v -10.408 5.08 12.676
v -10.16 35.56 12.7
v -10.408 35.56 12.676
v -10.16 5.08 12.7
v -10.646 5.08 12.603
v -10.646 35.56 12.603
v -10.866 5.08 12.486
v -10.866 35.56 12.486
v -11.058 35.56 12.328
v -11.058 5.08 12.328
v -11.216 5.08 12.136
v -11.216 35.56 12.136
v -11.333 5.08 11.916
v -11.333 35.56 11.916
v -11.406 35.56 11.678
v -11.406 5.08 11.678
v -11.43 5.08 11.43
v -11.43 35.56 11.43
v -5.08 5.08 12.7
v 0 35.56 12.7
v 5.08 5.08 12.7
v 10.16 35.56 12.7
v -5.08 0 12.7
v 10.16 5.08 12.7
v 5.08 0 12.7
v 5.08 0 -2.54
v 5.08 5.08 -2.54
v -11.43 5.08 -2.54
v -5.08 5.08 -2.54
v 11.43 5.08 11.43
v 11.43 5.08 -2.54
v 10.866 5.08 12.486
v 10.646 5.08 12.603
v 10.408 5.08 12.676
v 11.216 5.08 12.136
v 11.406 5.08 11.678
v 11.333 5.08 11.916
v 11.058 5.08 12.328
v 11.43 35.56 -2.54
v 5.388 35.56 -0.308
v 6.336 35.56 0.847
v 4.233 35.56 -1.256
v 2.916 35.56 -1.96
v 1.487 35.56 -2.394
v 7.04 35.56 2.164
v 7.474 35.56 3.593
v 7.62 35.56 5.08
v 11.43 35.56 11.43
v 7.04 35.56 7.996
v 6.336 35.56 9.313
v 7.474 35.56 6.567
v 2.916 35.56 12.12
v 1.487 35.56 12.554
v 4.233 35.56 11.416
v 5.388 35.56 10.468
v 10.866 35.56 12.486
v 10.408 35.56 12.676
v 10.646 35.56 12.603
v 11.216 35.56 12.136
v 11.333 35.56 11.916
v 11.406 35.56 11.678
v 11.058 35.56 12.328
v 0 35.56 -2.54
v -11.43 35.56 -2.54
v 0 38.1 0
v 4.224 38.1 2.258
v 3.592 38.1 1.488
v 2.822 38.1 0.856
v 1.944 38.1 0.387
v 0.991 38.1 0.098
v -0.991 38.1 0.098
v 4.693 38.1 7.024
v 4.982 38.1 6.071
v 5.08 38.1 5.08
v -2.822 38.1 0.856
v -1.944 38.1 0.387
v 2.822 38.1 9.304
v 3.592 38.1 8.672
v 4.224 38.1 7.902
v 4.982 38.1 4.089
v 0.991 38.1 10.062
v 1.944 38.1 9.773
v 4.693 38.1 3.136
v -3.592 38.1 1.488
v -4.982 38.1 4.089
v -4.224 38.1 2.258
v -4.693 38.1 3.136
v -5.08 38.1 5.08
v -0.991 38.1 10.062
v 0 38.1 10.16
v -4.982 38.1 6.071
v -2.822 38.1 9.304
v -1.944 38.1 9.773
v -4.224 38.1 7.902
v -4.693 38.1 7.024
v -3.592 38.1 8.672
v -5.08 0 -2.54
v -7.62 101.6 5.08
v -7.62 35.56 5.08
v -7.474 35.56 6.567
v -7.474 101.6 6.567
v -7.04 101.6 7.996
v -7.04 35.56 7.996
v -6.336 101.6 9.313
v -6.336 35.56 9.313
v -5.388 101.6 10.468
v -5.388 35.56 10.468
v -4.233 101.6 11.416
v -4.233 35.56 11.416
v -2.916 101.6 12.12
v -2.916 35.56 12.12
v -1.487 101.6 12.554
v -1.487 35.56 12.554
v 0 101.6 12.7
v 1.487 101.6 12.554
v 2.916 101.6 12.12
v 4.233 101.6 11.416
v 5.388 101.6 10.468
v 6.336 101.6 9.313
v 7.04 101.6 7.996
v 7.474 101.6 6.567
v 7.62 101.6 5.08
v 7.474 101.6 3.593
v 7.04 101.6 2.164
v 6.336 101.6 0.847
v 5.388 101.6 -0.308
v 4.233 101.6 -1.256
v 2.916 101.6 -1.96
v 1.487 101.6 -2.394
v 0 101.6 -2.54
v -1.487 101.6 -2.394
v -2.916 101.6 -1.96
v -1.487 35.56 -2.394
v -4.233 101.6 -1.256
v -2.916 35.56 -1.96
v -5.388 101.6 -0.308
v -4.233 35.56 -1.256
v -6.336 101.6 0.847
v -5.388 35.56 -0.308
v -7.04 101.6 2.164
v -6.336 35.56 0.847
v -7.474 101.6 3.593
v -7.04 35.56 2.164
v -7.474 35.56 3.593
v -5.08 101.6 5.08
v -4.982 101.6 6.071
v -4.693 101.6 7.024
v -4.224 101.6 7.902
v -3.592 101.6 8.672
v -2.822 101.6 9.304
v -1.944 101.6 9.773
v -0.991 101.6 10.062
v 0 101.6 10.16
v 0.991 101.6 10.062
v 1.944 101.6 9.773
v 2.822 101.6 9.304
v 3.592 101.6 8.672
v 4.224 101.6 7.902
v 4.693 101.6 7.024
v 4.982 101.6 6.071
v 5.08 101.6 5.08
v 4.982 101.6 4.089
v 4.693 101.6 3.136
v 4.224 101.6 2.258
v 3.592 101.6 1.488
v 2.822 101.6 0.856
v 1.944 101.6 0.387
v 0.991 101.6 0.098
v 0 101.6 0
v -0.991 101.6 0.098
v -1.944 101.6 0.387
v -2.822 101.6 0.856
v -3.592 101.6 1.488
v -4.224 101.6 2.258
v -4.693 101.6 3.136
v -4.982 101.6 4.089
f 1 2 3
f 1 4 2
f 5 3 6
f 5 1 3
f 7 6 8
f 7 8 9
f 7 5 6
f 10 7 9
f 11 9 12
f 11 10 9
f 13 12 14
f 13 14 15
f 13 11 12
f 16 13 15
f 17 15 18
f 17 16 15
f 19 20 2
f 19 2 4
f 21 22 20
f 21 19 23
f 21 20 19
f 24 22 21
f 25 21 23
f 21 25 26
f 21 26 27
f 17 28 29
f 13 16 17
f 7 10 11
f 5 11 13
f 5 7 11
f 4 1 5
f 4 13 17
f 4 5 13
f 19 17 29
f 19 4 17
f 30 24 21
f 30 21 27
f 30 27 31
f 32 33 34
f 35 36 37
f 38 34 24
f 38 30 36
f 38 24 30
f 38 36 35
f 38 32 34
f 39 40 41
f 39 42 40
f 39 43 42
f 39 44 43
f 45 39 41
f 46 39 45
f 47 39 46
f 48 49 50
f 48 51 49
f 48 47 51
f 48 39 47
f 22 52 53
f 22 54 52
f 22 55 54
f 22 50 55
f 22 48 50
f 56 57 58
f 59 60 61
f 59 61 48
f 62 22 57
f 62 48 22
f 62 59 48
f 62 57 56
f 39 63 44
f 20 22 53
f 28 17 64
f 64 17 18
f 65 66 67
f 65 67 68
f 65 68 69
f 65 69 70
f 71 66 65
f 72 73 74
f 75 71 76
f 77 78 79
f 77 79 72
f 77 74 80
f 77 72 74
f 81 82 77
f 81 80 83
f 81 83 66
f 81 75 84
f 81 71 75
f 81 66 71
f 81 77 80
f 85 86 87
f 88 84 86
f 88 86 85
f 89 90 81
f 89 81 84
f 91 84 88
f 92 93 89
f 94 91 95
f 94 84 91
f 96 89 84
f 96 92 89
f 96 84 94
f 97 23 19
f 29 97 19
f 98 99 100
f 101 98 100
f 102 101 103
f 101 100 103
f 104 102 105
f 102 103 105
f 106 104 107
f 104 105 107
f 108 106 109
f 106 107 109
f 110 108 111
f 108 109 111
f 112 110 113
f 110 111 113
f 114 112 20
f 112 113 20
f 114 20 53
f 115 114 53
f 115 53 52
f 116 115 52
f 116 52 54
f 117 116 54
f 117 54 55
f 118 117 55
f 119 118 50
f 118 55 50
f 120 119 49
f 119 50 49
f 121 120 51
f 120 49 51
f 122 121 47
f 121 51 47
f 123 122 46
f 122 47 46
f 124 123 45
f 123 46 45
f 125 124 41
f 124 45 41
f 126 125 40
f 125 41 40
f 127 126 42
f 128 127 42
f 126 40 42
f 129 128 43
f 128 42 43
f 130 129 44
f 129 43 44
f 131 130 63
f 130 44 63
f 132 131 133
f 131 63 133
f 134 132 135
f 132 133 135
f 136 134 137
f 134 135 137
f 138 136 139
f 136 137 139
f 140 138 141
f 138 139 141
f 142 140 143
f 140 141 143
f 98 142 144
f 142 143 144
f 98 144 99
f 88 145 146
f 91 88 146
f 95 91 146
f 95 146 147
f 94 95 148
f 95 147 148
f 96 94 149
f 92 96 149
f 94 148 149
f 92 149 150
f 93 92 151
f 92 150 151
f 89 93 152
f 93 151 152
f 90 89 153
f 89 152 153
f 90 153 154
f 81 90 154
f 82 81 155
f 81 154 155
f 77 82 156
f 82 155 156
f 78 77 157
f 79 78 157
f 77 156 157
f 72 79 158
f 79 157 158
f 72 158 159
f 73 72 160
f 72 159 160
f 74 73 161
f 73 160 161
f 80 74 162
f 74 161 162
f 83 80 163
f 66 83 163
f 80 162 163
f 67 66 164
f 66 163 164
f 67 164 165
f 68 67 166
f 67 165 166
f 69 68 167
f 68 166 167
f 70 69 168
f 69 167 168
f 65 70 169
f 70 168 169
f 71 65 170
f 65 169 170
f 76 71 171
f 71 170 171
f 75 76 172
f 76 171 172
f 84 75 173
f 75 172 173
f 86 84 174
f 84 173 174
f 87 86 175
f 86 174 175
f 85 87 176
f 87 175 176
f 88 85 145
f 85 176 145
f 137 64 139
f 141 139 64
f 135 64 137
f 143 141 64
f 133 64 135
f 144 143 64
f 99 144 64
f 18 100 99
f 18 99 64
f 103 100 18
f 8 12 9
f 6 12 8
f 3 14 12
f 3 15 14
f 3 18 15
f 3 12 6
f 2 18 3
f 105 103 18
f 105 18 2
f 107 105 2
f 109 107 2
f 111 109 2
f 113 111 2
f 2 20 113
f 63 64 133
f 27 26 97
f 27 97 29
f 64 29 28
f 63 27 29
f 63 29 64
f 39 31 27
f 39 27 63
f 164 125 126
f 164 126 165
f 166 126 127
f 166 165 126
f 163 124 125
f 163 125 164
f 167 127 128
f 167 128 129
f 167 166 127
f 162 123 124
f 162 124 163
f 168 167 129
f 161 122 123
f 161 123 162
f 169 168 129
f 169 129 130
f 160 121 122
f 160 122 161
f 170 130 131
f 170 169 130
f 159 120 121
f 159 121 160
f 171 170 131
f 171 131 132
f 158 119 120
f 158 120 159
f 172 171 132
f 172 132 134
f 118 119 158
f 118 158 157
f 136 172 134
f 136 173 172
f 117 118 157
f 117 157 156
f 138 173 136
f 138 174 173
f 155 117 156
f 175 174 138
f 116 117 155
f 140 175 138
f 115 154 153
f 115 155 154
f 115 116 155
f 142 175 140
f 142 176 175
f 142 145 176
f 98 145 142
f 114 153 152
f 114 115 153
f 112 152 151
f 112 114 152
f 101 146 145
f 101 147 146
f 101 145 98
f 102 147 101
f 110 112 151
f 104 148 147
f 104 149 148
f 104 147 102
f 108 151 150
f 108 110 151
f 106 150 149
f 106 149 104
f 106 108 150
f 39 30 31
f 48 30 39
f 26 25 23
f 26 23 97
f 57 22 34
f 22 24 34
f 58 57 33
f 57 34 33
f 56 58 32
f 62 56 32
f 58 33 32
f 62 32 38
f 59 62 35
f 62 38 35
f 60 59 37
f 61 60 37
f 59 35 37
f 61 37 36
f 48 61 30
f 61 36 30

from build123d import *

# Parameters (mm, degrees)
F1_DEPTH = 11.43
F2_W     = 6.35
F2_H     = 5.08
F3_DEPTH = 25.4
F4_R     = 7.62
F5_DEPTH = 66.04
F6_R     = 5.08
F7_DEPTH = 63.5
F8_R     = 1.27


with BuildPart() as f1:
    # F0 (on Right) → F1 (new body, symmetric)
    with BuildSketch(Plane.YZ):
        Polygon((35.56, 12.7), (0, 12.7), (0, 0), (0, -2.54), (35.56, -2.54), (35.56, 0), align=None)
    extrude(amount=F1_DEPTH, both=True)

    # F2 (on face) → F3 (cut)
    with BuildSketch(Plane.XY.offset(12.7)):
        with Locations((-8.255, 2.54)):
            Rectangle(F2_W, F2_H)
        with Locations((8.255, 2.54)):
            Rectangle(F2_W, F2_H)
    extrude(amount=-F3_DEPTH, mode=Mode.SUBTRACT)

    # F4 (on face) → F5 (join)
    with BuildSketch(Plane(origin=(0, 35.56, 0), x_dir=(-1, 0, 0), z_dir=(0, 1, 0))):
        with Locations((0, 5.08)):
            Circle(F4_R)
    extrude(amount=F5_DEPTH)

    # F6 (on face) → F7 (cut)
    with BuildSketch(Plane(origin=(0, 101.6, 0), x_dir=(-1, 0, 0), z_dir=(0, 1, 0))):
        with Locations((0, 5.08)):
            Circle(F6_R)
    extrude(amount=-F7_DEPTH, mode=Mode.SUBTRACT)

    # F8
    f8_edges = [f1.edges().sort_by_distance(p)[0] for p in [
        (-11.43, 20.32, 12.7),
        (11.43, 20.32, 12.7),
    ]]
    fillet(f8_edges, radius=F8_R)


solid = f1.part
